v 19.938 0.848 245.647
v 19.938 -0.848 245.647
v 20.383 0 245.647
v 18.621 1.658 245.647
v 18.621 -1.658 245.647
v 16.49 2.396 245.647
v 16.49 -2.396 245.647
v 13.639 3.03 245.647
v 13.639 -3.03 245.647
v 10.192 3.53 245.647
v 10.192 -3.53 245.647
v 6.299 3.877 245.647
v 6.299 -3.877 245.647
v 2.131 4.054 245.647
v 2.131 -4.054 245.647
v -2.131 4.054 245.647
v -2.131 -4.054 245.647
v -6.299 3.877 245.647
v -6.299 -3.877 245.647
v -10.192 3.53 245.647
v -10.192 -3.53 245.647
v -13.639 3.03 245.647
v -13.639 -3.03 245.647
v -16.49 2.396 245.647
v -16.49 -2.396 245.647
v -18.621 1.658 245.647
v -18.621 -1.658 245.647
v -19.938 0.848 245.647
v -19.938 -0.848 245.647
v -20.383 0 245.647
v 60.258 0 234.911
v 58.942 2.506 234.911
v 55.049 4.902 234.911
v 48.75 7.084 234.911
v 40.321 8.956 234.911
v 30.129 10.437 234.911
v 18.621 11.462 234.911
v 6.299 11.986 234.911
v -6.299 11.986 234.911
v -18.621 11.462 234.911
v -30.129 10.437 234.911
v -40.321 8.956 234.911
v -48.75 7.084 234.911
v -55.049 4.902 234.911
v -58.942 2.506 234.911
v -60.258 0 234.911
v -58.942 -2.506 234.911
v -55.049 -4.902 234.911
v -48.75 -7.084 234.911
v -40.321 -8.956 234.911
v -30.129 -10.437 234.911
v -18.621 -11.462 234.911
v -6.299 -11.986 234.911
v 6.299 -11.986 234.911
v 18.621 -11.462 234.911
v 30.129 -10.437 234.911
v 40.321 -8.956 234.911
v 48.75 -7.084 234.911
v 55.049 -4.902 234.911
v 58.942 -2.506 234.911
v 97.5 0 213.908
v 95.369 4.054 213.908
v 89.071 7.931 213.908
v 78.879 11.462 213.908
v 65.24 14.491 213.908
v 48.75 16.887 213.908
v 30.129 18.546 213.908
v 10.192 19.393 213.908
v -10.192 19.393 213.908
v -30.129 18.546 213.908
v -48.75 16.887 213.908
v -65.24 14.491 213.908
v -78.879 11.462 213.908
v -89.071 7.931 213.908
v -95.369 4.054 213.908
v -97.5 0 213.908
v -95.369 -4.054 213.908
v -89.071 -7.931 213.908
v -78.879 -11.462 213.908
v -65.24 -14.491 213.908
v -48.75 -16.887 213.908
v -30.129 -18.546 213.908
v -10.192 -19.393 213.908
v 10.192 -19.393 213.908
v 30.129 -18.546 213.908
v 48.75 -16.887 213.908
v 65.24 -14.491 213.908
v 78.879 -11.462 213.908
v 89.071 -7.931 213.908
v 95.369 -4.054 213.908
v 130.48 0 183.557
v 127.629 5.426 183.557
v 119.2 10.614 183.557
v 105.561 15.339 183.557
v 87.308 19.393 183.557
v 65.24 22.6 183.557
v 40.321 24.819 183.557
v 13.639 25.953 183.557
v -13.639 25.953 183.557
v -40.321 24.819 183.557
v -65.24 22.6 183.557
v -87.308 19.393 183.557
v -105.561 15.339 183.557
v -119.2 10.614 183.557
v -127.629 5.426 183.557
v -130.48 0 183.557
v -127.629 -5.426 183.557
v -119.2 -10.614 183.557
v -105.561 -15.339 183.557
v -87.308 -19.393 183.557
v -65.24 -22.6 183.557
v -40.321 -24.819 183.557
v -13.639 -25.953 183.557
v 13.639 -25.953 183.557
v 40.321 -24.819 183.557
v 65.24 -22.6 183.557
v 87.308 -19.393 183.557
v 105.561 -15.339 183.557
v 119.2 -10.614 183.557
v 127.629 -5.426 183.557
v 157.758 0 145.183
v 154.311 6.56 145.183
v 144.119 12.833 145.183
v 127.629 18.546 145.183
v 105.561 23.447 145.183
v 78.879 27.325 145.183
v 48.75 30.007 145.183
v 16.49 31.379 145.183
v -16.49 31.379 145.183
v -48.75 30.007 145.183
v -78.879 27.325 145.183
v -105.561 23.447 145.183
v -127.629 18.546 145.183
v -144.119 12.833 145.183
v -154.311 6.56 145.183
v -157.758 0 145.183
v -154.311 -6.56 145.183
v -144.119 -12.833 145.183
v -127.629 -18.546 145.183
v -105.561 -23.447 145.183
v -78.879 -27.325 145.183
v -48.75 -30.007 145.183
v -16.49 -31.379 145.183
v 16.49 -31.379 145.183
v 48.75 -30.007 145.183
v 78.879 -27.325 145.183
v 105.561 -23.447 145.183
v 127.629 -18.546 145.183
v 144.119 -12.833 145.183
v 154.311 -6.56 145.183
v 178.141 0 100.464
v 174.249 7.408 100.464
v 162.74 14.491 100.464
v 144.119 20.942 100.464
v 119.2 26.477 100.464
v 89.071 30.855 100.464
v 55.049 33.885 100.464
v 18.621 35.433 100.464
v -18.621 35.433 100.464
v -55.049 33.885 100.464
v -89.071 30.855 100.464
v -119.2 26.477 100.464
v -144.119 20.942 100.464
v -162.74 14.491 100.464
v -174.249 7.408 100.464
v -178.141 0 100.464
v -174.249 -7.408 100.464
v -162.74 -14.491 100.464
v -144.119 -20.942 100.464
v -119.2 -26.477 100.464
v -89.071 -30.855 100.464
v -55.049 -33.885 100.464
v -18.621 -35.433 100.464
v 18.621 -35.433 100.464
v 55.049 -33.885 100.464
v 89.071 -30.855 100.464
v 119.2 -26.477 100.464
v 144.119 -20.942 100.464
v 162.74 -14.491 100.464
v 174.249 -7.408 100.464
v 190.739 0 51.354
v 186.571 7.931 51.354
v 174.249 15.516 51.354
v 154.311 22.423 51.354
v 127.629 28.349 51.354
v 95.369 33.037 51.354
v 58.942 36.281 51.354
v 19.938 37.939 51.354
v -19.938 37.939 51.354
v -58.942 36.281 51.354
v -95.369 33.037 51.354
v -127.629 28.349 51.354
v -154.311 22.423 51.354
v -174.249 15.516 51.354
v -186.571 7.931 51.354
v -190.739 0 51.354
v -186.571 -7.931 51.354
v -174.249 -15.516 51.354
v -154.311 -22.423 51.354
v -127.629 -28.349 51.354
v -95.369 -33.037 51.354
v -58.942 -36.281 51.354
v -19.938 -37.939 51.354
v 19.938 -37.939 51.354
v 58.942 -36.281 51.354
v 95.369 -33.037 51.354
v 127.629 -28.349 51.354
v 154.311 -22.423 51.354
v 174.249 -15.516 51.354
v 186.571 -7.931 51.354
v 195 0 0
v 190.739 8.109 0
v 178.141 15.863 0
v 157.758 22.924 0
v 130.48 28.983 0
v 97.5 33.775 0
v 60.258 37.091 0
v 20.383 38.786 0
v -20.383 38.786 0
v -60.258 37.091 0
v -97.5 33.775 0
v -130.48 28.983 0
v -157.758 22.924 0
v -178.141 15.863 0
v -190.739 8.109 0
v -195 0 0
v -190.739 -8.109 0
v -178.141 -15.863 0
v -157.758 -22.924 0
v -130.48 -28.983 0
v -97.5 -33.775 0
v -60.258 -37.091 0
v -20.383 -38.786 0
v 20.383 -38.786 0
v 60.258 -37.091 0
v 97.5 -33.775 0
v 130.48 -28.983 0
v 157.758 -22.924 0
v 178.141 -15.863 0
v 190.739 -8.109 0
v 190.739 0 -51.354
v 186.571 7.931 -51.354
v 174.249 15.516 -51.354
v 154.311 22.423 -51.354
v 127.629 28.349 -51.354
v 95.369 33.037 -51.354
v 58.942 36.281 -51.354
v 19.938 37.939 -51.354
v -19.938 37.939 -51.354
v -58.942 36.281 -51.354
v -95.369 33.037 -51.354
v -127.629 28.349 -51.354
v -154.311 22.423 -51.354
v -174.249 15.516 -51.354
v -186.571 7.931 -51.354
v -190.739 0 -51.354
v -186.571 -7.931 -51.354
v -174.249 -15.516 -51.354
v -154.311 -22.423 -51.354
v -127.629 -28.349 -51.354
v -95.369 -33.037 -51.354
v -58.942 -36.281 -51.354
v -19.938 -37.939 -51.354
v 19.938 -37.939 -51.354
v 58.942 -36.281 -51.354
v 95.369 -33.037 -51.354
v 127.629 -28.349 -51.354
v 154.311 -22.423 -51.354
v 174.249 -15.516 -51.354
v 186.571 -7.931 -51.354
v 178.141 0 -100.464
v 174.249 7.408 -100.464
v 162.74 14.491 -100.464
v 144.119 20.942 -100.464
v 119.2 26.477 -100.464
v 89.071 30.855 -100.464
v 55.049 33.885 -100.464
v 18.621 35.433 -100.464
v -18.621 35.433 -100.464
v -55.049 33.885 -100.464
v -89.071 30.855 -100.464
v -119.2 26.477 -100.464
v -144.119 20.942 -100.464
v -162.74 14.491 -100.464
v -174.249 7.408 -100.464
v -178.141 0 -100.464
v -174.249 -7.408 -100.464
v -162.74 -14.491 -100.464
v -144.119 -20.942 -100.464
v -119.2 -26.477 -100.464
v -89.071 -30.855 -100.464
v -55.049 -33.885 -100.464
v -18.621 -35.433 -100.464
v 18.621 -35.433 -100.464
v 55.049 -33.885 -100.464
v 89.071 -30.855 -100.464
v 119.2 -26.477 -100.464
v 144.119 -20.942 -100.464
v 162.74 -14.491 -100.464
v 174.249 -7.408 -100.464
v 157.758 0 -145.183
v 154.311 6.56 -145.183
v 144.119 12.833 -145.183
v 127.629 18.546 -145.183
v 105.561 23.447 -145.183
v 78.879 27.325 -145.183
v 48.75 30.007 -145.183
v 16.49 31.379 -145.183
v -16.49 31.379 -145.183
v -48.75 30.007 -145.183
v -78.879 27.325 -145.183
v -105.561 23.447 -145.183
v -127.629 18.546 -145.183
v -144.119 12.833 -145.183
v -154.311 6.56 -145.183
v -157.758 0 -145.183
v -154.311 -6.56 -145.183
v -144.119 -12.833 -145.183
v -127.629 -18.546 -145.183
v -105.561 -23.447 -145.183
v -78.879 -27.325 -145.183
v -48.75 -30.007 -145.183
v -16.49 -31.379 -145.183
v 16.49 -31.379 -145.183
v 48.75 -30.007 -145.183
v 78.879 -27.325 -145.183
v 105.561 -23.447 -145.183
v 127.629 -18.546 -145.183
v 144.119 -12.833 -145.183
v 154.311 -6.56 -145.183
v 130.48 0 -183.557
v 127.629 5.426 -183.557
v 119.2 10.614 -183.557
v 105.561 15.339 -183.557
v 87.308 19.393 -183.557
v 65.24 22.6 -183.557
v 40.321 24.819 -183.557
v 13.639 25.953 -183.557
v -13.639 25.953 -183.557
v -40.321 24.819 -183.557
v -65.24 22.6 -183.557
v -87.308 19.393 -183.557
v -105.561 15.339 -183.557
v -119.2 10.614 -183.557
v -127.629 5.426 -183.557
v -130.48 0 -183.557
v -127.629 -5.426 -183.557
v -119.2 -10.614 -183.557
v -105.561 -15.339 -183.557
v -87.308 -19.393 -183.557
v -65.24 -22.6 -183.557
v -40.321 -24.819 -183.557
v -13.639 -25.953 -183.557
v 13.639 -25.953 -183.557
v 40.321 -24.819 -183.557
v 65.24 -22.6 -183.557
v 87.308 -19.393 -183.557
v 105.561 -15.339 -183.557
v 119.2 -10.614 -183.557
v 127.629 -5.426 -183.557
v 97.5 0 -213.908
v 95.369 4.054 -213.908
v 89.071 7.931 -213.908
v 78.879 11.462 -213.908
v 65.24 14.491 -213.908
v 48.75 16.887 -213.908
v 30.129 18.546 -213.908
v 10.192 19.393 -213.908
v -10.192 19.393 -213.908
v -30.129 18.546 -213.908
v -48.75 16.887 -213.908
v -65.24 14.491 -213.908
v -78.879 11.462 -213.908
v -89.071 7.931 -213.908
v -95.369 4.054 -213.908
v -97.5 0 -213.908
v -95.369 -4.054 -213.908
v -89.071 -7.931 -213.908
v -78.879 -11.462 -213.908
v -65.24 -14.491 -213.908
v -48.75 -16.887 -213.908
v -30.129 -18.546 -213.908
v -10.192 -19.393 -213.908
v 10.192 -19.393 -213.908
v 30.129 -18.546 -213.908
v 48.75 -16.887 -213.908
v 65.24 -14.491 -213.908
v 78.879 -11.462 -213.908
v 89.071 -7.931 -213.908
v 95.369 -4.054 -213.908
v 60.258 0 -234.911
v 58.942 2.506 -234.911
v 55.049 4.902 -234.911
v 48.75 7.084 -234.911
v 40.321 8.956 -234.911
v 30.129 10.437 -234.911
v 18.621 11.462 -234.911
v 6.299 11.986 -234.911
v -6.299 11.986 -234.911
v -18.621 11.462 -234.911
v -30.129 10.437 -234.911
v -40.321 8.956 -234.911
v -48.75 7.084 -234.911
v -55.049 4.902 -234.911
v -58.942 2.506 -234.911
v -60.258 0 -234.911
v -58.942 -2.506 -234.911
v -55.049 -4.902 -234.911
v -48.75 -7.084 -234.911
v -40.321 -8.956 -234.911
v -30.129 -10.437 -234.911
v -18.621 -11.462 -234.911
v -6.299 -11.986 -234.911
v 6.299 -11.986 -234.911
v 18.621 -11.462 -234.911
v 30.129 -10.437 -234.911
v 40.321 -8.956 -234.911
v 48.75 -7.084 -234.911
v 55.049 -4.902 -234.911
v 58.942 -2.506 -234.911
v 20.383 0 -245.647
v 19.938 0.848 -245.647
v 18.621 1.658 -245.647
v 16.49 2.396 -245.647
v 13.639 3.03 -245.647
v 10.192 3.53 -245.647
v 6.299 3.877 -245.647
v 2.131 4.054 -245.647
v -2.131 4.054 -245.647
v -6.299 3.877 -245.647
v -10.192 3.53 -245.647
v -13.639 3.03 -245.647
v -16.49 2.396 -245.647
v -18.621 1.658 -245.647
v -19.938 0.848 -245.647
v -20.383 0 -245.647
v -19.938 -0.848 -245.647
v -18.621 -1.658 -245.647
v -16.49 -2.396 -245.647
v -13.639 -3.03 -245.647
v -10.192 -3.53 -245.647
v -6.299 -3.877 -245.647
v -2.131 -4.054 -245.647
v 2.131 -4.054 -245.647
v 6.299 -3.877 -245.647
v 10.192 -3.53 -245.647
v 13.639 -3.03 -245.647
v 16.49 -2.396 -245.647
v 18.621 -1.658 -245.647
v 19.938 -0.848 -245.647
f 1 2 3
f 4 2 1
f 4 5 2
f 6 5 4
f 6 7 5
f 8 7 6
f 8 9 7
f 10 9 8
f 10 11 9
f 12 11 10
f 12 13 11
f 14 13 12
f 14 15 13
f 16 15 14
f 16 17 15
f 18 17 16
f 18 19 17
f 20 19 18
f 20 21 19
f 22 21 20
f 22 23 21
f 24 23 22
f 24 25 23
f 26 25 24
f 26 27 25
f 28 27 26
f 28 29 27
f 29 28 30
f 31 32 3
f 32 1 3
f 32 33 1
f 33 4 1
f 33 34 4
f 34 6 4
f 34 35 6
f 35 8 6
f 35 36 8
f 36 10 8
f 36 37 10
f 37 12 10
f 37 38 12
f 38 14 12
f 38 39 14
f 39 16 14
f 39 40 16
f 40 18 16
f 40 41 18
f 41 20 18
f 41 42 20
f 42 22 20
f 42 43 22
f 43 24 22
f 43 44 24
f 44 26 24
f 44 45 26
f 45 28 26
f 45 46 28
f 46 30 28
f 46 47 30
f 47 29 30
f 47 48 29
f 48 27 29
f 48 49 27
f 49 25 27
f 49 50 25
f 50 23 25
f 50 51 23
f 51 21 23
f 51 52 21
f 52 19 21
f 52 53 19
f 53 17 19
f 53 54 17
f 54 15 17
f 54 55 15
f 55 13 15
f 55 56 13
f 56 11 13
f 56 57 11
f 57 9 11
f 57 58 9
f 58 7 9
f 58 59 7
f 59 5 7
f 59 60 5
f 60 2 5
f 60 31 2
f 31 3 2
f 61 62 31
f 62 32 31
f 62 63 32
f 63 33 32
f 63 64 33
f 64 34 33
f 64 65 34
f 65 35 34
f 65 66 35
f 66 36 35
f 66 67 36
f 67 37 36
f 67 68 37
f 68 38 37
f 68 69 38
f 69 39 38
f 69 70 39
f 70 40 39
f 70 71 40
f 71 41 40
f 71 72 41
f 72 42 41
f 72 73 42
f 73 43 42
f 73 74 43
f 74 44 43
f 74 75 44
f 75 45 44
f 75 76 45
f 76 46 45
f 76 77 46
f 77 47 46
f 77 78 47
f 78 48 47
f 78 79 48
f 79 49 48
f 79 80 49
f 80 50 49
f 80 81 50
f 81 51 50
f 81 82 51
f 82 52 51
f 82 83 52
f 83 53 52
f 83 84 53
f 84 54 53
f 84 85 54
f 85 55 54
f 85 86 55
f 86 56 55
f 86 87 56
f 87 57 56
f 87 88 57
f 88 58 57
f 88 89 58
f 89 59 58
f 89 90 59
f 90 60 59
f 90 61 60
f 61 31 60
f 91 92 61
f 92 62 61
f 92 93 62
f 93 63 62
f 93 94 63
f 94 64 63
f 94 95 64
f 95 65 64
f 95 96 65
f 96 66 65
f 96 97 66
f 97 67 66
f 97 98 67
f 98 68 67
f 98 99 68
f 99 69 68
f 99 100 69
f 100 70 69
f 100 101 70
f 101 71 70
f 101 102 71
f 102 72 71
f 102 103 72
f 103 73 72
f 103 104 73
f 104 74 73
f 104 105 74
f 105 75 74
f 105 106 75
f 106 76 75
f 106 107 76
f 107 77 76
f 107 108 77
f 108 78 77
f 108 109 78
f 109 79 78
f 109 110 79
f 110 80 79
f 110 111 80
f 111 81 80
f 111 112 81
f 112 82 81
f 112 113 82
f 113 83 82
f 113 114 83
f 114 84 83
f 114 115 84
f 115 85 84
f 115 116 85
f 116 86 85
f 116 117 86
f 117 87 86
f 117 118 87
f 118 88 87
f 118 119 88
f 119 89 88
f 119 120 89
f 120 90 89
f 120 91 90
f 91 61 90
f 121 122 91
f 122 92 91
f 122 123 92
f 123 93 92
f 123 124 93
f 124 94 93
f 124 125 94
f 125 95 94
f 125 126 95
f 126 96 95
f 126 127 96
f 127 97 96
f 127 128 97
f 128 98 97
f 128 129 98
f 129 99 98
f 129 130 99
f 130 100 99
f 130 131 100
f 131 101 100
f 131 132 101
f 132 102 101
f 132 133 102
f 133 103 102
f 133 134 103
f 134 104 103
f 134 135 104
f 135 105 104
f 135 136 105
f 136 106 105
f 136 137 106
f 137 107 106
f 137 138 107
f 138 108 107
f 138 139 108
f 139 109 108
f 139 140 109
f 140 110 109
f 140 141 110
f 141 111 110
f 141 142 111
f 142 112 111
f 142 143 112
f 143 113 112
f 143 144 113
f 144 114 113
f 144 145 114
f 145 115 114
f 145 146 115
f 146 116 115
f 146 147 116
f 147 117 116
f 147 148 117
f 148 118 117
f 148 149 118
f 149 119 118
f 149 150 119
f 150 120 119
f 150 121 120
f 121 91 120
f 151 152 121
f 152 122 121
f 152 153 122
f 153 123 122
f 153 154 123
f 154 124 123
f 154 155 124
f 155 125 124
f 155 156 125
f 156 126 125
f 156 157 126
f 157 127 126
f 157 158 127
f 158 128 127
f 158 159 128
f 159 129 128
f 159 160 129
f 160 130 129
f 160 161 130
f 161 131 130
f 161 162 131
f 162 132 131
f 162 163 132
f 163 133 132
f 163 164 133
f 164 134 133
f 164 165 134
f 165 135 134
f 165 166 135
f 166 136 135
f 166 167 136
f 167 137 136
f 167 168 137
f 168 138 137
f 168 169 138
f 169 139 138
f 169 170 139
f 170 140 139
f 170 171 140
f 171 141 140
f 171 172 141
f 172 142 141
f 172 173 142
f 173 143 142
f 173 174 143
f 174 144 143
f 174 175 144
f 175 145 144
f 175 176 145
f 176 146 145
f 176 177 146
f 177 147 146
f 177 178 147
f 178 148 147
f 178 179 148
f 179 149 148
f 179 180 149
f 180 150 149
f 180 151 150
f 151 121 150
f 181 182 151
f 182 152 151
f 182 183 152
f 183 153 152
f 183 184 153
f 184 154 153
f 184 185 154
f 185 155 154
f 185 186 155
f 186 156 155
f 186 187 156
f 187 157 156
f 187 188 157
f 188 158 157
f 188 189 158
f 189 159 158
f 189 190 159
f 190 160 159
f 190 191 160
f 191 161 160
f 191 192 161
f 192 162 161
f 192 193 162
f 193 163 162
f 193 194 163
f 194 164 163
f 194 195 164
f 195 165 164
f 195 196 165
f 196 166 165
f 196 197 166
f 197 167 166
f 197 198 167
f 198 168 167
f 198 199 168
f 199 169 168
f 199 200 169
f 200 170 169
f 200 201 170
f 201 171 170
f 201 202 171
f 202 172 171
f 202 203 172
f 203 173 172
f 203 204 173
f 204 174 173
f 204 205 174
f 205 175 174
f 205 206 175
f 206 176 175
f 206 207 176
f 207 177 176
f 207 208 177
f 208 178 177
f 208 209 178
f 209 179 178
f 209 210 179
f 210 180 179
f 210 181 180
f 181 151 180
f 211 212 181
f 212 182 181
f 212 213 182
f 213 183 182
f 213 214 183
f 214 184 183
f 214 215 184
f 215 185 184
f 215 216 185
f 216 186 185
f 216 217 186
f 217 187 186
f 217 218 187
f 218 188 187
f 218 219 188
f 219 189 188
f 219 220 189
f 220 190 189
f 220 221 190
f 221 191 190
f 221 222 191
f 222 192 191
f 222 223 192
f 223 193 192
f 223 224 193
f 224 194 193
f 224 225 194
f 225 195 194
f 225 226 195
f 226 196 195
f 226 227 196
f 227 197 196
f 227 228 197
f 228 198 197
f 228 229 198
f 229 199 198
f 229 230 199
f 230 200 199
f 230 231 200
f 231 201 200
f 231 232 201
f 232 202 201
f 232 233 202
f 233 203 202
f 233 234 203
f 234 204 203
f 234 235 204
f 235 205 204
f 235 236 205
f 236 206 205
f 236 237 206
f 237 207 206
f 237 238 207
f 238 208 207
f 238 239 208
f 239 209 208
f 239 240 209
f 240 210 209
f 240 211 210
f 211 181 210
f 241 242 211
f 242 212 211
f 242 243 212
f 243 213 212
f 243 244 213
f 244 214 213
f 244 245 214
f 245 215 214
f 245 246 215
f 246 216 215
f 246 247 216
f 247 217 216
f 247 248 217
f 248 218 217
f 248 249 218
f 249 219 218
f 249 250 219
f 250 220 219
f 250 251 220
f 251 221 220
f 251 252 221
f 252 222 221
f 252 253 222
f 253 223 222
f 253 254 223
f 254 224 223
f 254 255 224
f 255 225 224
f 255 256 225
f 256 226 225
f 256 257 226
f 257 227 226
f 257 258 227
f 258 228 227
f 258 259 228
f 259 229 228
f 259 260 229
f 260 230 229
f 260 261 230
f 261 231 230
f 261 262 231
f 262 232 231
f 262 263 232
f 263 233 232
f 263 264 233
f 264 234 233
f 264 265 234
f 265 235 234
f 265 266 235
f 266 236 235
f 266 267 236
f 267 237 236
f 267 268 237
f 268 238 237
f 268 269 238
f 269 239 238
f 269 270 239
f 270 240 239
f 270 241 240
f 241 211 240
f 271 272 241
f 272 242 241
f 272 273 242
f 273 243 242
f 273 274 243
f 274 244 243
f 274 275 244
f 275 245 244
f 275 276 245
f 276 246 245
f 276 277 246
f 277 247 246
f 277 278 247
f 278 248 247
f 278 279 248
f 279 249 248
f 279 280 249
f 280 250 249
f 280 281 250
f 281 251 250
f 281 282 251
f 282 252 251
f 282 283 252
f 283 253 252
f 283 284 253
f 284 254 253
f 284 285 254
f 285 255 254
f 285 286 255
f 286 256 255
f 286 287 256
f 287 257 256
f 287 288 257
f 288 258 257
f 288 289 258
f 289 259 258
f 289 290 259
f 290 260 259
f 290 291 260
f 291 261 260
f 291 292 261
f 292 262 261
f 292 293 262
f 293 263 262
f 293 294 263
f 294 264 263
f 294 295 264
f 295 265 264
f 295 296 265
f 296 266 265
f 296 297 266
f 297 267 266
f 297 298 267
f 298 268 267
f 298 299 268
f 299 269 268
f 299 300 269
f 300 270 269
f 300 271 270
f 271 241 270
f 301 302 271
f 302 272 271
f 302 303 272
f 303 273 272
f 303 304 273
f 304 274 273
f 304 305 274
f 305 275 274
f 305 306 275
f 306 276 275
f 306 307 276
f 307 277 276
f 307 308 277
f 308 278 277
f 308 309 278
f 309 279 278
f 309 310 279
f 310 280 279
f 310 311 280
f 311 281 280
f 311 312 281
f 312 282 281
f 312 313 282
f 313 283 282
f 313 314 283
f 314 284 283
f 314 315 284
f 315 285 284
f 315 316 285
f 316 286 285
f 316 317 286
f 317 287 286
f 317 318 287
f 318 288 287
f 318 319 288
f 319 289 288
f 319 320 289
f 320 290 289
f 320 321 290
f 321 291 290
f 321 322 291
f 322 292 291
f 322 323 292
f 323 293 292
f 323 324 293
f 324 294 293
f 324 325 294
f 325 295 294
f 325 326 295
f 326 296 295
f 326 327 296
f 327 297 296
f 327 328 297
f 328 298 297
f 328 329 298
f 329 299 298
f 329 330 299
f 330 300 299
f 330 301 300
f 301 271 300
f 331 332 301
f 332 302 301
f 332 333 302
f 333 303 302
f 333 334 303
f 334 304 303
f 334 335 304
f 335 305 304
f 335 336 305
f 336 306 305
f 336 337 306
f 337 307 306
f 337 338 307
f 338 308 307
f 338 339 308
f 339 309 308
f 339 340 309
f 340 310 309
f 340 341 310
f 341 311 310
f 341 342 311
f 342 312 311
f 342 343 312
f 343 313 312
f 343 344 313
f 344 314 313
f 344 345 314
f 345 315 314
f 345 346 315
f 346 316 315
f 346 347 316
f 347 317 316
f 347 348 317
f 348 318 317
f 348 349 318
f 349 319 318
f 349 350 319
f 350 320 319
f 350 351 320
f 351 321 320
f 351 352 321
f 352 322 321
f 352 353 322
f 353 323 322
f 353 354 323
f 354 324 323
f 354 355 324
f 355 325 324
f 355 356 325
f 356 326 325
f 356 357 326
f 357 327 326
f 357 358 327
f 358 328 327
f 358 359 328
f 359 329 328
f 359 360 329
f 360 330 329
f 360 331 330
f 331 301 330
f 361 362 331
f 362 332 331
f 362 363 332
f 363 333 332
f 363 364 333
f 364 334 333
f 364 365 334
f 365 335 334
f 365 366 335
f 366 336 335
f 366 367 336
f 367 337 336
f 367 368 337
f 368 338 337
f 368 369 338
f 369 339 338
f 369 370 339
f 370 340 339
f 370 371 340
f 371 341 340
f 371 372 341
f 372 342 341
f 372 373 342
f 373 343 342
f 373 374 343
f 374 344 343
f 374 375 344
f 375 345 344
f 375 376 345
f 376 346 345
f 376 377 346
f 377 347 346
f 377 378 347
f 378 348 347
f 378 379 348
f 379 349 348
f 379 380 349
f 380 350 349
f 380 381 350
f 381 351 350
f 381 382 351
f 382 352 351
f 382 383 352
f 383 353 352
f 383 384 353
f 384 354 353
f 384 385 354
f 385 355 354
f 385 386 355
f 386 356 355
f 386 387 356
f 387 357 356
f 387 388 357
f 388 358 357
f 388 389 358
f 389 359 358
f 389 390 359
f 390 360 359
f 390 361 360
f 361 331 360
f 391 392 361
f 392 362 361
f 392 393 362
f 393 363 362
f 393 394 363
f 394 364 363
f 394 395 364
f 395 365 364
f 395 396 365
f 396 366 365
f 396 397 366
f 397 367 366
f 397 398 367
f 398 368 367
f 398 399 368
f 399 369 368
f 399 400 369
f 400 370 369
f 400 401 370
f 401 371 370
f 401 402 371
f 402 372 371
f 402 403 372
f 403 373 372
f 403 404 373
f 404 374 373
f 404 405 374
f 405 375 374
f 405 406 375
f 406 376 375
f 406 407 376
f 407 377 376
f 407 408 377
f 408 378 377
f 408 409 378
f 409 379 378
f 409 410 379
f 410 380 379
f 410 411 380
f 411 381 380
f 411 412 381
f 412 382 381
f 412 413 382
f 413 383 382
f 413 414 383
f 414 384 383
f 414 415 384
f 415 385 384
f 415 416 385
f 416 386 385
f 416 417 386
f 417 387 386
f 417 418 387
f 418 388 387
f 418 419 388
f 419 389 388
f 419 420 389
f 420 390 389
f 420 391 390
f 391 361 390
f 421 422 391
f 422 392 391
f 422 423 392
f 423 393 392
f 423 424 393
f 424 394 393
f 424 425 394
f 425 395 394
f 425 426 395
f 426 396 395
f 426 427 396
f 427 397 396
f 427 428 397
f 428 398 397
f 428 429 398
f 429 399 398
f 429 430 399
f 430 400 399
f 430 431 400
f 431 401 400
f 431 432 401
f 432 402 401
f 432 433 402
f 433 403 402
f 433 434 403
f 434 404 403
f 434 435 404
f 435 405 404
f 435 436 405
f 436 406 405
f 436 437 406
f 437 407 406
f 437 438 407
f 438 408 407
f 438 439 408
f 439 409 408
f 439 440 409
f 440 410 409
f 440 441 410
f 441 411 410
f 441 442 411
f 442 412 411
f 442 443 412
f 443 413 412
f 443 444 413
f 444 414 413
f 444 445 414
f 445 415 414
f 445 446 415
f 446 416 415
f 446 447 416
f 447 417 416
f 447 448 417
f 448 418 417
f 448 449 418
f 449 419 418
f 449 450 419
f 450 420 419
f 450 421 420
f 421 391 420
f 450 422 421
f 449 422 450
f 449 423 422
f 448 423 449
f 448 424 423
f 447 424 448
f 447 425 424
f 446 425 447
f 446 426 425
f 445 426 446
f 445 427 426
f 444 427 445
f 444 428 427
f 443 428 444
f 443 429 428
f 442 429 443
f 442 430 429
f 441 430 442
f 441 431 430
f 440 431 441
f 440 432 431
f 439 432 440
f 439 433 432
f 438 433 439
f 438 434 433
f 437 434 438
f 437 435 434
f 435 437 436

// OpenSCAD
// Generated by SolidPython 1.0.1 on 2020-07-29 00:46:51


scale(v = [15, 3, 19]) {
	sphere(r = 13);
}
/***********************************************
*********      SolidPython code:      **********
************************************************
 
# import packages: SolidPython
from solid import *
from solid.utils import *
from itertools import chain, combinations, permutations


class Resize:

    def __init__(self, scad_file):
        self.scad_file = scad_file
        #self.scad_file = import_scad(scad_file)
        # cone/cylinder param:
        self.r1 = 0
        self.r2 = 0
        self.h = 0
        # rectangular prism param:
        self.w = 0
        self.l = 0
        # ellipse param:
        self.r = 0

    # import OpenScad code (file name corresponds to shape)


    # classify shape + parameters
    def assign(self, param1, param2, param3):
        if self.scad_file == 'cone.scad':
            self.r1 = param1
            self.r2 = param2
            self.h = param3
        elif self.scad_file == 'cylinder.scad':
            self.r1 = param1
            self.r2 = param2
            self.h = param3
        elif self.scad_file == 'rectangularPrism.scad':
            self.h = param1
            self.l = param2
            self.w = param3
        else:
            self.r = param1
            self.h = param2

    # resize parameters
    def iterate(self):
        x = range(3, 20, 2)
        i = 1
        if self.scad_file == 'cone.scad':
            tempList = list(permutations(x, 2))
            for temp in tempList:
                param1 = temp[0]
                param2 = temp[1]
                filepath = 'produced_scad_files/' + 'cone' + str(param1) + '_' + str(param2) + '_' + '.scad'
                scad_render_to_file(cylinder(h=param1, r1=param2, r2=0), filepath)

        elif self.scad_file == 'cylinder.scad':
            tempList = list(permutations(x, 3))
            for temp in tempList:
                param1 = temp[0]
                param2 = temp[1]
                filepath = 'produced_scad_files/' + 'cylinder' + str(param1) + '_' + str(param2) + '_' + '.scad'
                scad_render_to_file(cylinder(h=param1, r1=param2, r2=param2), filepath)

        elif self.scad_file == 'rectangularPrism.scad':
            tempList = list(permutations(x, 3))
            for temp in tempList:
                param1 = temp[0]
                param2 = temp[1]
                param3 = temp[2]
                filepath = 'produced_scad_files/' + 'rectangularPrism' + str(param1) + '_' + str(param2) + '_' + str(
                    param3) + '.scad'
                scad_render_to_file(cube(size=(param1, param2, param3)), filepath)

        elif self.scad_file == 'ellipse.scad':
            tempList = list(permutations(x, 4))
            for temp in tempList:
                param1 = temp[0]
                param2 = temp[1]
                param3 = temp[2]
                param4 = temp[3]
                filepath = 'produced_scad_files/' + 'ellipse' + str(param1) + '_' + str(param2) + '_' + str(param3) + '_' + str(param4) + '.scad'
                scad_render_to_file(scale([param1, param2, param3])(sphere(r=param4)), filepath)

    def render_to_scadfile(self):
        scad_render_to_file(scad, 'example.scad') 
 
************************************************/
